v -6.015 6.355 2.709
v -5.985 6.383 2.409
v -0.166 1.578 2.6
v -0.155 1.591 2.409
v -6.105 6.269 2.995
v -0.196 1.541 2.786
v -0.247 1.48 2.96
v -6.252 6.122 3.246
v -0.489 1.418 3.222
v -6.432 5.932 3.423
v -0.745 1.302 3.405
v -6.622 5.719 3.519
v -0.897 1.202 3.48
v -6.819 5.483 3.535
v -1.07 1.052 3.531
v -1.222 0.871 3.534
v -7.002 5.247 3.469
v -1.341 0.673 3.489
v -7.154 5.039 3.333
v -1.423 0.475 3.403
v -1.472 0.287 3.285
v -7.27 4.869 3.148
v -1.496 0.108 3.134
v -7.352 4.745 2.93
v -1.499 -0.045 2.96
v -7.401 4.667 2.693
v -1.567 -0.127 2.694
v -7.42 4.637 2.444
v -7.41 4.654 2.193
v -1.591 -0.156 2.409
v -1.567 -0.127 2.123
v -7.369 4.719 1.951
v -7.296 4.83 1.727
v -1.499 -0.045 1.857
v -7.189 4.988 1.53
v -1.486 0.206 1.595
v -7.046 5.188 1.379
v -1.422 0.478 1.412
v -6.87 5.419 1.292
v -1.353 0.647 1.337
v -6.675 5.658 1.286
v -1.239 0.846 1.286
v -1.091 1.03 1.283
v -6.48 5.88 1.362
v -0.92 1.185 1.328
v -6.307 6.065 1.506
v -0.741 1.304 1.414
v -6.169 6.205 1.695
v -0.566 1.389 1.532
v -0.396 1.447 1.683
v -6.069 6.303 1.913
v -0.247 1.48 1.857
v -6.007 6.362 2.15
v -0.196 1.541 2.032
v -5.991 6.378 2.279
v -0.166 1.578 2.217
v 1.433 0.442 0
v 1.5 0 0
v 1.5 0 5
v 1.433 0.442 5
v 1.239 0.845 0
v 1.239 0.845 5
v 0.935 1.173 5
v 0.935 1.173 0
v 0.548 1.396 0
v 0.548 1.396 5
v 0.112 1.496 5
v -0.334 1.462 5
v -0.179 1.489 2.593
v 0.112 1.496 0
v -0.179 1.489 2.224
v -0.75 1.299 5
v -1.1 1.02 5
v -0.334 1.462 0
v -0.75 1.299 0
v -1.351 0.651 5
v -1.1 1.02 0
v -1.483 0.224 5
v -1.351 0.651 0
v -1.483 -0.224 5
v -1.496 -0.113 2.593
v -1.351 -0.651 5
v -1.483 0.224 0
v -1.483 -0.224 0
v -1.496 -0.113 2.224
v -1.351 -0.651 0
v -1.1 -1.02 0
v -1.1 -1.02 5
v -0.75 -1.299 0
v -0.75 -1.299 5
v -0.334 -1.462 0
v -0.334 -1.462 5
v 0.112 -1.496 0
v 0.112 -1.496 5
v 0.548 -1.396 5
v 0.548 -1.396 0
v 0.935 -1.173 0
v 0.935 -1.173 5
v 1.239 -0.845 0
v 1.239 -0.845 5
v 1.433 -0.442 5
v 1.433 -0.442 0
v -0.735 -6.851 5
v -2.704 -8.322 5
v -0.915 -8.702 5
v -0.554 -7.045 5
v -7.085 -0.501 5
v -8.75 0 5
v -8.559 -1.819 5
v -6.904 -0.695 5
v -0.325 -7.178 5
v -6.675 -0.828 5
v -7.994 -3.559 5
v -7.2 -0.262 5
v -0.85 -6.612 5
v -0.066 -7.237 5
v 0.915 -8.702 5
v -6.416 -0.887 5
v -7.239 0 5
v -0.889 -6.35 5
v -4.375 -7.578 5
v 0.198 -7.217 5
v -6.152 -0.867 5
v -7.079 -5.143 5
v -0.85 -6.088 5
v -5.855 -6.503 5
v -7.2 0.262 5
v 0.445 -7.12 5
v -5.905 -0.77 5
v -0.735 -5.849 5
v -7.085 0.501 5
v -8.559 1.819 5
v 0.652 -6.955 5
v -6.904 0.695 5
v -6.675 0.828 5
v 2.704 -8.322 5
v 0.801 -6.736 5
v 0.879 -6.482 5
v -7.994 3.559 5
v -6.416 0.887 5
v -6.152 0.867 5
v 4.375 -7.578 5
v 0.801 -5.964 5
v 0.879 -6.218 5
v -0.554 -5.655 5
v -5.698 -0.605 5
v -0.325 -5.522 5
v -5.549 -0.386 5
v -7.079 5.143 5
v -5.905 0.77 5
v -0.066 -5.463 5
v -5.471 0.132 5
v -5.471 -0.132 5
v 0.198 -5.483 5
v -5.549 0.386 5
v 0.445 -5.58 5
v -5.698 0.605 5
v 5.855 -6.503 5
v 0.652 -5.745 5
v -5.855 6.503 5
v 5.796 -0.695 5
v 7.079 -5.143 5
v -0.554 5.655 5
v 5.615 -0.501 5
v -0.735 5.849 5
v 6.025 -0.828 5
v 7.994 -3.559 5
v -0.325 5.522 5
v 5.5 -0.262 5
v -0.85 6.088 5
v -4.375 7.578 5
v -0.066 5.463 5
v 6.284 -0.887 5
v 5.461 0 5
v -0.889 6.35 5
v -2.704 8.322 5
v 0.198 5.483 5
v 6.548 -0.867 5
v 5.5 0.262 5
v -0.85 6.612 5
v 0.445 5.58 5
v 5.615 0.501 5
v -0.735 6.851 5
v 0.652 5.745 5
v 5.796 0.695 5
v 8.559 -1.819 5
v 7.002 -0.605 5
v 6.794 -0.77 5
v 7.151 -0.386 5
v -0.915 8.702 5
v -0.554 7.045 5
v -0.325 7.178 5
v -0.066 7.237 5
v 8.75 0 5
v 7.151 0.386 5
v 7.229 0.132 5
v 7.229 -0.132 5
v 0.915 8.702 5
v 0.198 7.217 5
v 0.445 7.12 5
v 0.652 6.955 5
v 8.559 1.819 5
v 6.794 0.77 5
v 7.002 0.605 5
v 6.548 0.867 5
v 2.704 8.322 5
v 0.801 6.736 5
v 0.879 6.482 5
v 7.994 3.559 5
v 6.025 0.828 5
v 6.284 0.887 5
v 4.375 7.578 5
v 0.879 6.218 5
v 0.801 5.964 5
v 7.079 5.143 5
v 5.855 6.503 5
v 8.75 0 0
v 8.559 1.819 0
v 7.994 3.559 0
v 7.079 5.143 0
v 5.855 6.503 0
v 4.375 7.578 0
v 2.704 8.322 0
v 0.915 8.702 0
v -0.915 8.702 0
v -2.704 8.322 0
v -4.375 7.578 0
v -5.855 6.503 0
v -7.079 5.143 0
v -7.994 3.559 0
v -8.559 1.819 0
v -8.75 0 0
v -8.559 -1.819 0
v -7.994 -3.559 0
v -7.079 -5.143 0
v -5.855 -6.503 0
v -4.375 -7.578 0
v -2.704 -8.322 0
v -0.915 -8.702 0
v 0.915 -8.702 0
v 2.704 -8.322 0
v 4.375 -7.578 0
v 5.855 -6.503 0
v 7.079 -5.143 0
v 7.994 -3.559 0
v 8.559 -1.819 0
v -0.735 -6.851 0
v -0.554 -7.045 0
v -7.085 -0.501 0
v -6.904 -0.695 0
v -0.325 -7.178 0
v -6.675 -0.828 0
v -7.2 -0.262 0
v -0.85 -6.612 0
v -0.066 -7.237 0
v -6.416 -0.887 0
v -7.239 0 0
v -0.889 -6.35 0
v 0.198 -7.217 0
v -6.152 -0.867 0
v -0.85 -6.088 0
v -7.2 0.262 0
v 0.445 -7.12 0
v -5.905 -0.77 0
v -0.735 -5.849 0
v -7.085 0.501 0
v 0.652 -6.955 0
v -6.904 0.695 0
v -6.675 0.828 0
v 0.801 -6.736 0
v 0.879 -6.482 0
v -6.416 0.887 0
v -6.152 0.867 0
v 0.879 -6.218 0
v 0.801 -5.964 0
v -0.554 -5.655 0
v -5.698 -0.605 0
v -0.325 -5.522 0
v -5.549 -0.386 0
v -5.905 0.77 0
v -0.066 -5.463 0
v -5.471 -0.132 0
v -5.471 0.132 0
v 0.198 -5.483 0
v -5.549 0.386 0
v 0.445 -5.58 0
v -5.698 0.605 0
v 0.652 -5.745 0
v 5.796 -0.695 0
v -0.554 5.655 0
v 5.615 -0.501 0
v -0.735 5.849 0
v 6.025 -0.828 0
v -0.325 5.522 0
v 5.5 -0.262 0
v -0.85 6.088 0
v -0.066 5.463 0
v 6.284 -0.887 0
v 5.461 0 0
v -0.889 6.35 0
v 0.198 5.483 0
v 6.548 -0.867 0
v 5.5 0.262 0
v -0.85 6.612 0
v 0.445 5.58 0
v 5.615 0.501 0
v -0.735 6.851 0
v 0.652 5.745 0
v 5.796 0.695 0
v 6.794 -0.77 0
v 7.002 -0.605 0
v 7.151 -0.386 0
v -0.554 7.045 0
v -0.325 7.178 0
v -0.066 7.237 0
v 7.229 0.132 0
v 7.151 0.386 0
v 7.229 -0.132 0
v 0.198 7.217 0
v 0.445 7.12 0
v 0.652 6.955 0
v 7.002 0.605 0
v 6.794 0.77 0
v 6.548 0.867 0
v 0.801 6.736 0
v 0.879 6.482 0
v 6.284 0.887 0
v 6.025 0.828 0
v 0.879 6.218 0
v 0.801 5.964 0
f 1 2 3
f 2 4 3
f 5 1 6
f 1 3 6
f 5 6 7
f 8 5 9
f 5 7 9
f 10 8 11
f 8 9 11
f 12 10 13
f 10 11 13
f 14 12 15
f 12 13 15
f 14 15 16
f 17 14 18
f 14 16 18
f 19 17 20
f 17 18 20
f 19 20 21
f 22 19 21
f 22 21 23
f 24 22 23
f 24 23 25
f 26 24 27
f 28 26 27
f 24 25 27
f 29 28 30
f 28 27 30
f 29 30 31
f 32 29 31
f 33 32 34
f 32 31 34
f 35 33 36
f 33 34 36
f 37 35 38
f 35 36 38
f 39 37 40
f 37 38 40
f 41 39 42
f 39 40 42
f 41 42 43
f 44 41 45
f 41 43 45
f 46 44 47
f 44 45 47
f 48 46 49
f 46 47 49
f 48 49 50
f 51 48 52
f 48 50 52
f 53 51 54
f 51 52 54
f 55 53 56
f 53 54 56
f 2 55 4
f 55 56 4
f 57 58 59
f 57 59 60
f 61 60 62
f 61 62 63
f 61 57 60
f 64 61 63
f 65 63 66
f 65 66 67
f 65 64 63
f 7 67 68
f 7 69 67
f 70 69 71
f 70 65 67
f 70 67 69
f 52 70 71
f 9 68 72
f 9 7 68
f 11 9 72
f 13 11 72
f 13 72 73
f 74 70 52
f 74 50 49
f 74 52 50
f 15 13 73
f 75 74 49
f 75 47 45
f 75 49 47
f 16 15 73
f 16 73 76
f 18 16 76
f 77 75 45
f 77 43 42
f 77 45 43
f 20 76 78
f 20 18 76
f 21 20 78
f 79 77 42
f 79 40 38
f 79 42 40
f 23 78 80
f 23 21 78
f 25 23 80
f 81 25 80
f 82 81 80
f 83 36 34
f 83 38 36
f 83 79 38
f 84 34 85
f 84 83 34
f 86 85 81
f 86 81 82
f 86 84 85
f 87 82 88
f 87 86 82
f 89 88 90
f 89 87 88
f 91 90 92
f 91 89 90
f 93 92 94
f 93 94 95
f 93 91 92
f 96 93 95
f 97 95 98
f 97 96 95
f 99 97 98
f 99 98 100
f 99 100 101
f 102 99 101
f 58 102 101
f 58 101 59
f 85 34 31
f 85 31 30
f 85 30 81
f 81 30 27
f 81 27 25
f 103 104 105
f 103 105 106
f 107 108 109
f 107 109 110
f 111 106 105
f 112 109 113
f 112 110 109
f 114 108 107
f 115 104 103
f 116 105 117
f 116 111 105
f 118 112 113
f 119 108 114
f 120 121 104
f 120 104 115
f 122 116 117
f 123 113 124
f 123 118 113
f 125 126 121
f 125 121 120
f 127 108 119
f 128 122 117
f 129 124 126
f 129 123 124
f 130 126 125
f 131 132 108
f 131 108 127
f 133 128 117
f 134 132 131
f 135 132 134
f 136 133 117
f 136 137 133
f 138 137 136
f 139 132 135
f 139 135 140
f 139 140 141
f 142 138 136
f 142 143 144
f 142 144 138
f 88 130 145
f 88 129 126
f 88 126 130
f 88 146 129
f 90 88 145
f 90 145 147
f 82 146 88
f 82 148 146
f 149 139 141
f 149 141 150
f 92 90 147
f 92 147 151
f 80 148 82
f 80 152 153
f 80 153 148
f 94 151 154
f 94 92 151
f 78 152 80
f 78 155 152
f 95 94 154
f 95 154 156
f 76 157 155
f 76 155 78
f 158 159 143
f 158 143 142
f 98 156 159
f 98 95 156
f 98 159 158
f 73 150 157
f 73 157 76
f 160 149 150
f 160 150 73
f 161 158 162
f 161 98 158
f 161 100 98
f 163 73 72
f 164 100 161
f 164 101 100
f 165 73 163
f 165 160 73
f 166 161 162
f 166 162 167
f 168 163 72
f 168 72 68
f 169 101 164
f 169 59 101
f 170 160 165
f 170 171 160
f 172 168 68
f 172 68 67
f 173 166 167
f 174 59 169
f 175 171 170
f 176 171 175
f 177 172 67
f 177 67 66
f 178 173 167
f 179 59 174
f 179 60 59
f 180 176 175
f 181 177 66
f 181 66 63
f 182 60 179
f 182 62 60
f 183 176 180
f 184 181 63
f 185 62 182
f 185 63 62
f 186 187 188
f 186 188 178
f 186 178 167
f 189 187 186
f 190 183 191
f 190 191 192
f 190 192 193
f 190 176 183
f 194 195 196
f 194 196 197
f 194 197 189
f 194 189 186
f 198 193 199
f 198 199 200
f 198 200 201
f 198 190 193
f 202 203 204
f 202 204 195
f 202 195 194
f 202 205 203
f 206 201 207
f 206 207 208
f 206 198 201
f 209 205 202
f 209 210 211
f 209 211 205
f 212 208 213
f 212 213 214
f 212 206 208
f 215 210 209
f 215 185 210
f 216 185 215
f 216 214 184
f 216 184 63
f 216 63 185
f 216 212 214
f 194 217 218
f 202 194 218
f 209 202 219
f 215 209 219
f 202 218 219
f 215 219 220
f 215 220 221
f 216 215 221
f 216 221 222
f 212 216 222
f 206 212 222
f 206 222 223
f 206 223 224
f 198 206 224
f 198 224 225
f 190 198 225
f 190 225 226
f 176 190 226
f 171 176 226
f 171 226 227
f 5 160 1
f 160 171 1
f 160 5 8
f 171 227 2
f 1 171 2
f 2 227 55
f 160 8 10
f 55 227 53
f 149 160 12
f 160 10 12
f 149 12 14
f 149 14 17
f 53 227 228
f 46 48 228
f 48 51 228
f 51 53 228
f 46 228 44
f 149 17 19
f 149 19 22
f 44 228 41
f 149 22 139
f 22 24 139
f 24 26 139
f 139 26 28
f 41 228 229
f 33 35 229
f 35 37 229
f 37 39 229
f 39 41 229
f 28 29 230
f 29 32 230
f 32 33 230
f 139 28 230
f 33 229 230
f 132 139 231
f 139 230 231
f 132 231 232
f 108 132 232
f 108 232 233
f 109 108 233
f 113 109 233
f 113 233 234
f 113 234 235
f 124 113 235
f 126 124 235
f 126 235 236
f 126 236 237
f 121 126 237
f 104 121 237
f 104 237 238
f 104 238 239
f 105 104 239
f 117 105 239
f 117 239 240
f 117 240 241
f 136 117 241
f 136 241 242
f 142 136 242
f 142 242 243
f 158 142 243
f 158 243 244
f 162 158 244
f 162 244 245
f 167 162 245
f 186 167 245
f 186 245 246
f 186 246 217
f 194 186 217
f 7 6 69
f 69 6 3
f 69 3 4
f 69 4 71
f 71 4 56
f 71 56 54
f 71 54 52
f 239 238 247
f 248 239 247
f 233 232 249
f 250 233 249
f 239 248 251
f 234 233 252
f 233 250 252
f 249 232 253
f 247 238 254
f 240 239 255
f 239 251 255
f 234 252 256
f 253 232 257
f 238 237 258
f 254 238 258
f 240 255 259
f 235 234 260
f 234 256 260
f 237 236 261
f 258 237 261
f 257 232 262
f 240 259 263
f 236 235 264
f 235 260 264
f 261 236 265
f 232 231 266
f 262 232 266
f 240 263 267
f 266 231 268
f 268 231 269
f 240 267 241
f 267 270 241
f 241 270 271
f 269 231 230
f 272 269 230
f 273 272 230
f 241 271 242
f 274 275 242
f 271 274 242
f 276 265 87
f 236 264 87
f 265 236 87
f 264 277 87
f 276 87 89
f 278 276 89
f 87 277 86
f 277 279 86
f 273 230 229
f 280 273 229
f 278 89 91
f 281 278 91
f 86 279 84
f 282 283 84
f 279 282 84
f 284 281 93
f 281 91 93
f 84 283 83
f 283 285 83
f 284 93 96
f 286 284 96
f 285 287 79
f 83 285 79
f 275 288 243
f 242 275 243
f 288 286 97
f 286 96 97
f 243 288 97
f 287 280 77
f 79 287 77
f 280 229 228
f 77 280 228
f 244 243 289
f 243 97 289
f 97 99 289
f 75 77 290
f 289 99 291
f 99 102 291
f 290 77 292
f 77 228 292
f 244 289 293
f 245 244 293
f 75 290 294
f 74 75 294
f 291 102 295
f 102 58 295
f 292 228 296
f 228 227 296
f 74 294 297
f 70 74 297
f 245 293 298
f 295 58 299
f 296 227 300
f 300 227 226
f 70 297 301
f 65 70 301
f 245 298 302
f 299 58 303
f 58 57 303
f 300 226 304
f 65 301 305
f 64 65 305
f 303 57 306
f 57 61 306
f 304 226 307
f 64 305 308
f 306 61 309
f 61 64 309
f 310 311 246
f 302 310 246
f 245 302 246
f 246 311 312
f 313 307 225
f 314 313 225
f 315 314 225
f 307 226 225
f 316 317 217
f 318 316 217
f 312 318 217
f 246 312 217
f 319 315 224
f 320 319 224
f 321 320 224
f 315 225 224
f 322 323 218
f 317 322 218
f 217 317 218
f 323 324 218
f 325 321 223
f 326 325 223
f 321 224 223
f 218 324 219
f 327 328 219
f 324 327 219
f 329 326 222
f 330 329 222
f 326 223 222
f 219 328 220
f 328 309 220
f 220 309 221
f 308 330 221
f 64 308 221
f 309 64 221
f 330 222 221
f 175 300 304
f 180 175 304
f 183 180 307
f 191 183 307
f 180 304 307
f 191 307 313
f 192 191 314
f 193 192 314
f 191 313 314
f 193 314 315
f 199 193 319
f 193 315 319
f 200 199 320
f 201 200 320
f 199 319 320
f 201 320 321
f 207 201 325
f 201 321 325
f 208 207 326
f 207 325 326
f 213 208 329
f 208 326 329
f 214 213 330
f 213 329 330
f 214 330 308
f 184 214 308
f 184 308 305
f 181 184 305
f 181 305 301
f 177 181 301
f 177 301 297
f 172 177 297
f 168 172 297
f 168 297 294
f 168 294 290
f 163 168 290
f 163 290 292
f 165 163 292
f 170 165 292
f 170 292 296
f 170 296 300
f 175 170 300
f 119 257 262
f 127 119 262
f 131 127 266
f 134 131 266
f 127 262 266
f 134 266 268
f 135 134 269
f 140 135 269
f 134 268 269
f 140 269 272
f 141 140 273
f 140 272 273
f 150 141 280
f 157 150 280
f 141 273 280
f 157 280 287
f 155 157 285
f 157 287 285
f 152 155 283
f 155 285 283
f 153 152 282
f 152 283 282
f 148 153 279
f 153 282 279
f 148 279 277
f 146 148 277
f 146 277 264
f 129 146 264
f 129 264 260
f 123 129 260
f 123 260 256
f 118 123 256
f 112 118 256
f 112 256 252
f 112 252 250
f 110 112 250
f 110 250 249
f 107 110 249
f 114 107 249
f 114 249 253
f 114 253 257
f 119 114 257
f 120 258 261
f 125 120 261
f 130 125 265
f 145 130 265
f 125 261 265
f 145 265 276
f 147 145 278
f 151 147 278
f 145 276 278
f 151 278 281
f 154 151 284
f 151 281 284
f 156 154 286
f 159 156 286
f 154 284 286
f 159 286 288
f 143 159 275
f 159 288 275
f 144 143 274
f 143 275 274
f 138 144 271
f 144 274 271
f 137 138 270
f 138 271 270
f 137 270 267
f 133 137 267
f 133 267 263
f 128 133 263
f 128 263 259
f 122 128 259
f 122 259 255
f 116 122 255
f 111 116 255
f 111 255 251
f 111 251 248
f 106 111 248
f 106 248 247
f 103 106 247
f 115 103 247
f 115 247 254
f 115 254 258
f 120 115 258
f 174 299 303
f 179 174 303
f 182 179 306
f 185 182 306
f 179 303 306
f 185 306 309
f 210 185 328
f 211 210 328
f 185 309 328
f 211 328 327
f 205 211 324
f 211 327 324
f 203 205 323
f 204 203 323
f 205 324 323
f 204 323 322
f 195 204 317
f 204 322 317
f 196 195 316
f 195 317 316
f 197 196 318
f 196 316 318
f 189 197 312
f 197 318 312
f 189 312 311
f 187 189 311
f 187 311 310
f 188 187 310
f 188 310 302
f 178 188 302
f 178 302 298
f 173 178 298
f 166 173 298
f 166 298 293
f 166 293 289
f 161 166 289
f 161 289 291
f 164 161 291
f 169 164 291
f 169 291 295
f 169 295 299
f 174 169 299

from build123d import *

# Parameters (mm, degrees)
SKETCH1_R                 = 8.75
SKETCH1_R_2               = 1.5
BOSS_EXTRUDE1_DEPTH       = 5
F_2_56_TAPPED_HOLE1_D     = 1.778
F_4_40_TAPPED_HOLE1_D     = 2.2606
F_4_40_TAPPED_HOLE1_DEPTH = 7.62
F_4_40_TAPPED_HOLE1_TIP   = 0.679152758


with BuildPart() as part:
    # Sketch1 → Boss-Extrude1 (new body)
    with BuildSketch(Plane.XY):
        Circle(SKETCH1_R)
        Circle(SKETCH1_R_2, mode=Mode.SUBTRACT)
    extrude(amount=BOSS_EXTRUDE1_DEPTH)

    # #2-56 Tapped Hole1 (through all)
    with Locations(Plane.XY.offset(5)):
        with Locations((-6.35, 0), (0, 6.35), (6.35, 0), (0, -6.35)):
            Hole(F_2_56_TAPPED_HOLE1_D / 2)

    # #4-40 Tapped Hole1
    with Locations(Plane(origin=(-6.759669176, 5.556021295, 2.40860038), x_dir=(-0.634973862285, -0.772533620119, 0), z_dir=(-0.772533620119, 0.634973862285, 0))):
        with Locations((0, 0)):
            Hole(F_4_40_TAPPED_HOLE1_D / 2, depth=F_4_40_TAPPED_HOLE1_DEPTH)
            with Locations((0, 0, -(F_4_40_TAPPED_HOLE1_DEPTH + F_4_40_TAPPED_HOLE1_TIP / 2))):  # 118° drill point
                Cone(0, F_4_40_TAPPED_HOLE1_D / 2, F_4_40_TAPPED_HOLE1_TIP, mode=Mode.SUBTRACT)


solid = part.part
